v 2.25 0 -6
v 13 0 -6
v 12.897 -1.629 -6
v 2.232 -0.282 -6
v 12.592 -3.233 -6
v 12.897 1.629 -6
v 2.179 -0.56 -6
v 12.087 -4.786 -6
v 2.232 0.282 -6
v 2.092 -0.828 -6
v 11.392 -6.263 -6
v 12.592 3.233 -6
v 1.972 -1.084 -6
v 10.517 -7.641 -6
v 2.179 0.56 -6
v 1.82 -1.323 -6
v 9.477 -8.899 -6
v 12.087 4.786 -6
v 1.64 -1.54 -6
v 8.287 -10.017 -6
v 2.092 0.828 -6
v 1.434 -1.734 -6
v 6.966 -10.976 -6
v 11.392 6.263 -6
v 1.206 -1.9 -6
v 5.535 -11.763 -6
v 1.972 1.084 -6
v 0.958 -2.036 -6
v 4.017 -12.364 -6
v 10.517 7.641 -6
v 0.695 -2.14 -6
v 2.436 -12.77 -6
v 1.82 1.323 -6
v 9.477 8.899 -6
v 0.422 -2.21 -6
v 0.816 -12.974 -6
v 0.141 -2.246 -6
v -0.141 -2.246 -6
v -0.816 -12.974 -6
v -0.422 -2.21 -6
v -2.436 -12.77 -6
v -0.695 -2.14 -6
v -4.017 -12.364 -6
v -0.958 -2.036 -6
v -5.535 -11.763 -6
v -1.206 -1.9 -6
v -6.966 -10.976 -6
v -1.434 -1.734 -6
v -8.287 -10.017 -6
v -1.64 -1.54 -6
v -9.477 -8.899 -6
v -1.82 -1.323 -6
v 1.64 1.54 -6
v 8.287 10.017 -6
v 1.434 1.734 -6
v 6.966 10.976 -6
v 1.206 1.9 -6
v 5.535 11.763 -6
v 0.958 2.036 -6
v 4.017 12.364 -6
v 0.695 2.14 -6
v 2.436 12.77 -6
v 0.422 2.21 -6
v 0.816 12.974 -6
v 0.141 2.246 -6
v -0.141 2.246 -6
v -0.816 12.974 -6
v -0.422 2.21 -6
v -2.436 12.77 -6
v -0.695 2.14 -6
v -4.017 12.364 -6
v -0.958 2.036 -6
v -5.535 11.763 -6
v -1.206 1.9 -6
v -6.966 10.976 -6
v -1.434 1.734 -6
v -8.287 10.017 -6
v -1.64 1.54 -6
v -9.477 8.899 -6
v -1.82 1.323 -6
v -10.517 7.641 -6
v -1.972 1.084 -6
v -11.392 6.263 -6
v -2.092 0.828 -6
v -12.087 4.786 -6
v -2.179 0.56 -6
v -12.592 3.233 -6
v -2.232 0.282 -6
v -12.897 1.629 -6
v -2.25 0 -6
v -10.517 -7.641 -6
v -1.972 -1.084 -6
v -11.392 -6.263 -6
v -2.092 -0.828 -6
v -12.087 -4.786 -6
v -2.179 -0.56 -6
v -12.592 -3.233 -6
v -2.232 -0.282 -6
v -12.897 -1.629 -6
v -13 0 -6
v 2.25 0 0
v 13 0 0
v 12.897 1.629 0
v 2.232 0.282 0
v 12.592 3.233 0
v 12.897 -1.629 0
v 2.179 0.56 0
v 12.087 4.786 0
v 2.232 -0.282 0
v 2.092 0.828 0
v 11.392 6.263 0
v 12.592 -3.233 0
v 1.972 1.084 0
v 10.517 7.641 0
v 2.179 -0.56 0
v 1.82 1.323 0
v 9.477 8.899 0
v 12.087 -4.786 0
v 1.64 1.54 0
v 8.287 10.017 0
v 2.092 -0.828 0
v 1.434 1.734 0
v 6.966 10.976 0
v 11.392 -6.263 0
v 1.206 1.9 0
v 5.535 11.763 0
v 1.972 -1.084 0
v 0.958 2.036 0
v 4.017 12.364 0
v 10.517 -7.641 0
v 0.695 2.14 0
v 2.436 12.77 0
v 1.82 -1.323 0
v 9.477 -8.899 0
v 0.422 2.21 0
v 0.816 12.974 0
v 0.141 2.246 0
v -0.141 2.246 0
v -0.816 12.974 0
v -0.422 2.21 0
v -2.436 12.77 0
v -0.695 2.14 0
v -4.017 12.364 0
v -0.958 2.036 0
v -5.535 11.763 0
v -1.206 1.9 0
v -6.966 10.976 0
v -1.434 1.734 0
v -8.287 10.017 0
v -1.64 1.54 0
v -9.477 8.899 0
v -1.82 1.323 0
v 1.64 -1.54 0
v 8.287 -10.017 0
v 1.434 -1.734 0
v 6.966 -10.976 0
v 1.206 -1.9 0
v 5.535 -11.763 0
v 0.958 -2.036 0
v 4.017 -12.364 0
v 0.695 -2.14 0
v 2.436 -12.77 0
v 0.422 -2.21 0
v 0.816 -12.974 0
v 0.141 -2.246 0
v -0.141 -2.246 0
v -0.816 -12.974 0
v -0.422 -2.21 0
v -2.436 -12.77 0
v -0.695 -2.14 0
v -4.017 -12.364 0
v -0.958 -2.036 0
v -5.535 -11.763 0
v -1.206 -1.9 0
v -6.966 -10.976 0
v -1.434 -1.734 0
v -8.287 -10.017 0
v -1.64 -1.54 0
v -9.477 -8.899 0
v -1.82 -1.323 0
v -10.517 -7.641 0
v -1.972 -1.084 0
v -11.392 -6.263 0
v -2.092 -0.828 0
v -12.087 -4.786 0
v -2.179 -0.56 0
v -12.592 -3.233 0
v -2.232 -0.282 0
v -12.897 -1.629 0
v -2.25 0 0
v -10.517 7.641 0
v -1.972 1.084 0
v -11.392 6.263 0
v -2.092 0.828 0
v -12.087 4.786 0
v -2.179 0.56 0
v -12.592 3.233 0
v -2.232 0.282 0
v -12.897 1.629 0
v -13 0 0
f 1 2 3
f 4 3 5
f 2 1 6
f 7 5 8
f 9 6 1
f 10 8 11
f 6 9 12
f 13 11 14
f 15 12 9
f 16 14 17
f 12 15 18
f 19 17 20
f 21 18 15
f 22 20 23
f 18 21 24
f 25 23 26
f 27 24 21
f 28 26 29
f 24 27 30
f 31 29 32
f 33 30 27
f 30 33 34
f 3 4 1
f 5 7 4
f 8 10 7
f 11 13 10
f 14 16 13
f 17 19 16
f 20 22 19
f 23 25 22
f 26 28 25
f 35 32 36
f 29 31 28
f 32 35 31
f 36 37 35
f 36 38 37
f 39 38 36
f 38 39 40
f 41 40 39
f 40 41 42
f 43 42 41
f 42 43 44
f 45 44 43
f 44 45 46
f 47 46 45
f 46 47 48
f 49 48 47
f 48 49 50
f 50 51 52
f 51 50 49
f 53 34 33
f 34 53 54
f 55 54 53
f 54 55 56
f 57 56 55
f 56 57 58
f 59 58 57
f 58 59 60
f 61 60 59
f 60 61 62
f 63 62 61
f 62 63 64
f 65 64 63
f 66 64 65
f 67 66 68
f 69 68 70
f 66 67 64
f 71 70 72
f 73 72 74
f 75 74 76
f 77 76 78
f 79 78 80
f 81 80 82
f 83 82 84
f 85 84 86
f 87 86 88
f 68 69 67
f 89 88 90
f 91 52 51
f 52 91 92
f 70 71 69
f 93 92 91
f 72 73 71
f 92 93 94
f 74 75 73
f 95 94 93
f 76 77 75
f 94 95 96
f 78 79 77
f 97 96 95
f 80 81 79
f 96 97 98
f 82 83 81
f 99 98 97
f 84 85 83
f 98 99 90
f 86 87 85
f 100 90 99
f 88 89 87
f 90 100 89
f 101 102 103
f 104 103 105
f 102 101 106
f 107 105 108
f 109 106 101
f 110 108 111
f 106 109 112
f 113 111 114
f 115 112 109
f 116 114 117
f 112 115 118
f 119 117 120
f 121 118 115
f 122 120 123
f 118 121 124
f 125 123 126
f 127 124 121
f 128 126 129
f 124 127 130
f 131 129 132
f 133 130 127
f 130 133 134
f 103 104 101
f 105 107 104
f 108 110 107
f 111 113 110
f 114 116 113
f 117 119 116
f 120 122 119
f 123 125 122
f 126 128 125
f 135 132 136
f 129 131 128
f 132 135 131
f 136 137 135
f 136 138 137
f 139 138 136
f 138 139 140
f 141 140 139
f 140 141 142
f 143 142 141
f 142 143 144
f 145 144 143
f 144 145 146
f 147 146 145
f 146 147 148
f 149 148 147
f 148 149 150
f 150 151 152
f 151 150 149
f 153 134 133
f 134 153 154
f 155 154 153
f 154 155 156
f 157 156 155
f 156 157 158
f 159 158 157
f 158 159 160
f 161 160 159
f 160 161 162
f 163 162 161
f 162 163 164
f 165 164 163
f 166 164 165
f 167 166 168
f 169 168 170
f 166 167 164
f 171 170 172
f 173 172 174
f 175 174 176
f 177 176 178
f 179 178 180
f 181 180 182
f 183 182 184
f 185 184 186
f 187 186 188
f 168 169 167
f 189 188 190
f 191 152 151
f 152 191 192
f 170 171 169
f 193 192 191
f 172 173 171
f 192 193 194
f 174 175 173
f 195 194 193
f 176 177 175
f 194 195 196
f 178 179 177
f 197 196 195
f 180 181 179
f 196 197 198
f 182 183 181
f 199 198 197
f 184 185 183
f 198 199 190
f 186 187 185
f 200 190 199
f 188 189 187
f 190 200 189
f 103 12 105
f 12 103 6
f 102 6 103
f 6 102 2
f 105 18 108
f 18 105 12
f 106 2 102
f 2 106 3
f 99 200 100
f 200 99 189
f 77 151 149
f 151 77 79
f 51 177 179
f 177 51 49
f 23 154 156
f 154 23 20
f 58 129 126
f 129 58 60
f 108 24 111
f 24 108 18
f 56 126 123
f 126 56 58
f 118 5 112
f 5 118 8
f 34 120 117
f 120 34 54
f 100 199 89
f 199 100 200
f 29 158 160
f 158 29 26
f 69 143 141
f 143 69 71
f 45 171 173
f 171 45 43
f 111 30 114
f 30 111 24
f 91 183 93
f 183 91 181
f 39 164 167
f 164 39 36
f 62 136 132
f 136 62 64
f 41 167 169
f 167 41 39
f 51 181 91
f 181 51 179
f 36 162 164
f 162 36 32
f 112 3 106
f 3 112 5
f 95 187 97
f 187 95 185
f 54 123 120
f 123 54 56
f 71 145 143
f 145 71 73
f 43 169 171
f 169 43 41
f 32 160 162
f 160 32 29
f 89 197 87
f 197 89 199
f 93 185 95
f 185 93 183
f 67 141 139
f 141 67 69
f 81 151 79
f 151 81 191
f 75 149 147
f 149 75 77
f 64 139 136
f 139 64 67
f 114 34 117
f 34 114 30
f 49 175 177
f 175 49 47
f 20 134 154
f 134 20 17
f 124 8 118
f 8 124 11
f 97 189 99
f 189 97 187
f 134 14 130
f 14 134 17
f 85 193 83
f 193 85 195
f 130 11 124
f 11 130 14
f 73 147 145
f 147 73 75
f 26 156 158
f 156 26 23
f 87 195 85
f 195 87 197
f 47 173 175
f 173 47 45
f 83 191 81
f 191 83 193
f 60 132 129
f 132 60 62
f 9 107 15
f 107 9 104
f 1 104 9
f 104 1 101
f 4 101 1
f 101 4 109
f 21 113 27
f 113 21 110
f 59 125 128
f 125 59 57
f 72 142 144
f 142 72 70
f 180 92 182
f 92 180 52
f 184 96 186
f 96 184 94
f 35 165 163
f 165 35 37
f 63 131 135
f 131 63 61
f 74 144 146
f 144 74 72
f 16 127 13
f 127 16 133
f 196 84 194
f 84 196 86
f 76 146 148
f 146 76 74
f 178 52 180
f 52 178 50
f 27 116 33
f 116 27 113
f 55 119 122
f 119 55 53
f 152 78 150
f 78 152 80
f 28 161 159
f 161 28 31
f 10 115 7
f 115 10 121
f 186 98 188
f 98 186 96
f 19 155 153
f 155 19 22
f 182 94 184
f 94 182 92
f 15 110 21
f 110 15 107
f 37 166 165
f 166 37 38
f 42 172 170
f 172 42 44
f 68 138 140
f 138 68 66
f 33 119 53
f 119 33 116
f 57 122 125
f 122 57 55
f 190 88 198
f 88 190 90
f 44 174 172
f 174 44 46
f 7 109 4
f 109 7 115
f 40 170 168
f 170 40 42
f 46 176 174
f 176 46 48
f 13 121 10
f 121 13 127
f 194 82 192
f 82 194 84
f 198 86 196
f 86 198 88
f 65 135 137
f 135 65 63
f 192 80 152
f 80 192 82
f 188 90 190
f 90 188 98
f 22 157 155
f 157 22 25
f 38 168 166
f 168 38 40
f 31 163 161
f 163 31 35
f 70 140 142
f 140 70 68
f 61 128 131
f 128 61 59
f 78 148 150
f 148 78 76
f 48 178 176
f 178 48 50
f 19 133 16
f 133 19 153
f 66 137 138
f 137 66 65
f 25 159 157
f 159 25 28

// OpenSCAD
$fn = 50;


difference() {
	union() {
		translate(v = [0, 0, -6.0000000000]) {
			cylinder(h = 6, r = 7.0000000000);
		}
		translate(v = [0, 0, -6.0000000000]) {
			cylinder(h = 6, r = 13.0000000000);
		}
	}
	union() {
		#translate(v = [0, 0, -6]) {
			cylinder(h = 6, r = 2.2500000000);
		}
	}
}
